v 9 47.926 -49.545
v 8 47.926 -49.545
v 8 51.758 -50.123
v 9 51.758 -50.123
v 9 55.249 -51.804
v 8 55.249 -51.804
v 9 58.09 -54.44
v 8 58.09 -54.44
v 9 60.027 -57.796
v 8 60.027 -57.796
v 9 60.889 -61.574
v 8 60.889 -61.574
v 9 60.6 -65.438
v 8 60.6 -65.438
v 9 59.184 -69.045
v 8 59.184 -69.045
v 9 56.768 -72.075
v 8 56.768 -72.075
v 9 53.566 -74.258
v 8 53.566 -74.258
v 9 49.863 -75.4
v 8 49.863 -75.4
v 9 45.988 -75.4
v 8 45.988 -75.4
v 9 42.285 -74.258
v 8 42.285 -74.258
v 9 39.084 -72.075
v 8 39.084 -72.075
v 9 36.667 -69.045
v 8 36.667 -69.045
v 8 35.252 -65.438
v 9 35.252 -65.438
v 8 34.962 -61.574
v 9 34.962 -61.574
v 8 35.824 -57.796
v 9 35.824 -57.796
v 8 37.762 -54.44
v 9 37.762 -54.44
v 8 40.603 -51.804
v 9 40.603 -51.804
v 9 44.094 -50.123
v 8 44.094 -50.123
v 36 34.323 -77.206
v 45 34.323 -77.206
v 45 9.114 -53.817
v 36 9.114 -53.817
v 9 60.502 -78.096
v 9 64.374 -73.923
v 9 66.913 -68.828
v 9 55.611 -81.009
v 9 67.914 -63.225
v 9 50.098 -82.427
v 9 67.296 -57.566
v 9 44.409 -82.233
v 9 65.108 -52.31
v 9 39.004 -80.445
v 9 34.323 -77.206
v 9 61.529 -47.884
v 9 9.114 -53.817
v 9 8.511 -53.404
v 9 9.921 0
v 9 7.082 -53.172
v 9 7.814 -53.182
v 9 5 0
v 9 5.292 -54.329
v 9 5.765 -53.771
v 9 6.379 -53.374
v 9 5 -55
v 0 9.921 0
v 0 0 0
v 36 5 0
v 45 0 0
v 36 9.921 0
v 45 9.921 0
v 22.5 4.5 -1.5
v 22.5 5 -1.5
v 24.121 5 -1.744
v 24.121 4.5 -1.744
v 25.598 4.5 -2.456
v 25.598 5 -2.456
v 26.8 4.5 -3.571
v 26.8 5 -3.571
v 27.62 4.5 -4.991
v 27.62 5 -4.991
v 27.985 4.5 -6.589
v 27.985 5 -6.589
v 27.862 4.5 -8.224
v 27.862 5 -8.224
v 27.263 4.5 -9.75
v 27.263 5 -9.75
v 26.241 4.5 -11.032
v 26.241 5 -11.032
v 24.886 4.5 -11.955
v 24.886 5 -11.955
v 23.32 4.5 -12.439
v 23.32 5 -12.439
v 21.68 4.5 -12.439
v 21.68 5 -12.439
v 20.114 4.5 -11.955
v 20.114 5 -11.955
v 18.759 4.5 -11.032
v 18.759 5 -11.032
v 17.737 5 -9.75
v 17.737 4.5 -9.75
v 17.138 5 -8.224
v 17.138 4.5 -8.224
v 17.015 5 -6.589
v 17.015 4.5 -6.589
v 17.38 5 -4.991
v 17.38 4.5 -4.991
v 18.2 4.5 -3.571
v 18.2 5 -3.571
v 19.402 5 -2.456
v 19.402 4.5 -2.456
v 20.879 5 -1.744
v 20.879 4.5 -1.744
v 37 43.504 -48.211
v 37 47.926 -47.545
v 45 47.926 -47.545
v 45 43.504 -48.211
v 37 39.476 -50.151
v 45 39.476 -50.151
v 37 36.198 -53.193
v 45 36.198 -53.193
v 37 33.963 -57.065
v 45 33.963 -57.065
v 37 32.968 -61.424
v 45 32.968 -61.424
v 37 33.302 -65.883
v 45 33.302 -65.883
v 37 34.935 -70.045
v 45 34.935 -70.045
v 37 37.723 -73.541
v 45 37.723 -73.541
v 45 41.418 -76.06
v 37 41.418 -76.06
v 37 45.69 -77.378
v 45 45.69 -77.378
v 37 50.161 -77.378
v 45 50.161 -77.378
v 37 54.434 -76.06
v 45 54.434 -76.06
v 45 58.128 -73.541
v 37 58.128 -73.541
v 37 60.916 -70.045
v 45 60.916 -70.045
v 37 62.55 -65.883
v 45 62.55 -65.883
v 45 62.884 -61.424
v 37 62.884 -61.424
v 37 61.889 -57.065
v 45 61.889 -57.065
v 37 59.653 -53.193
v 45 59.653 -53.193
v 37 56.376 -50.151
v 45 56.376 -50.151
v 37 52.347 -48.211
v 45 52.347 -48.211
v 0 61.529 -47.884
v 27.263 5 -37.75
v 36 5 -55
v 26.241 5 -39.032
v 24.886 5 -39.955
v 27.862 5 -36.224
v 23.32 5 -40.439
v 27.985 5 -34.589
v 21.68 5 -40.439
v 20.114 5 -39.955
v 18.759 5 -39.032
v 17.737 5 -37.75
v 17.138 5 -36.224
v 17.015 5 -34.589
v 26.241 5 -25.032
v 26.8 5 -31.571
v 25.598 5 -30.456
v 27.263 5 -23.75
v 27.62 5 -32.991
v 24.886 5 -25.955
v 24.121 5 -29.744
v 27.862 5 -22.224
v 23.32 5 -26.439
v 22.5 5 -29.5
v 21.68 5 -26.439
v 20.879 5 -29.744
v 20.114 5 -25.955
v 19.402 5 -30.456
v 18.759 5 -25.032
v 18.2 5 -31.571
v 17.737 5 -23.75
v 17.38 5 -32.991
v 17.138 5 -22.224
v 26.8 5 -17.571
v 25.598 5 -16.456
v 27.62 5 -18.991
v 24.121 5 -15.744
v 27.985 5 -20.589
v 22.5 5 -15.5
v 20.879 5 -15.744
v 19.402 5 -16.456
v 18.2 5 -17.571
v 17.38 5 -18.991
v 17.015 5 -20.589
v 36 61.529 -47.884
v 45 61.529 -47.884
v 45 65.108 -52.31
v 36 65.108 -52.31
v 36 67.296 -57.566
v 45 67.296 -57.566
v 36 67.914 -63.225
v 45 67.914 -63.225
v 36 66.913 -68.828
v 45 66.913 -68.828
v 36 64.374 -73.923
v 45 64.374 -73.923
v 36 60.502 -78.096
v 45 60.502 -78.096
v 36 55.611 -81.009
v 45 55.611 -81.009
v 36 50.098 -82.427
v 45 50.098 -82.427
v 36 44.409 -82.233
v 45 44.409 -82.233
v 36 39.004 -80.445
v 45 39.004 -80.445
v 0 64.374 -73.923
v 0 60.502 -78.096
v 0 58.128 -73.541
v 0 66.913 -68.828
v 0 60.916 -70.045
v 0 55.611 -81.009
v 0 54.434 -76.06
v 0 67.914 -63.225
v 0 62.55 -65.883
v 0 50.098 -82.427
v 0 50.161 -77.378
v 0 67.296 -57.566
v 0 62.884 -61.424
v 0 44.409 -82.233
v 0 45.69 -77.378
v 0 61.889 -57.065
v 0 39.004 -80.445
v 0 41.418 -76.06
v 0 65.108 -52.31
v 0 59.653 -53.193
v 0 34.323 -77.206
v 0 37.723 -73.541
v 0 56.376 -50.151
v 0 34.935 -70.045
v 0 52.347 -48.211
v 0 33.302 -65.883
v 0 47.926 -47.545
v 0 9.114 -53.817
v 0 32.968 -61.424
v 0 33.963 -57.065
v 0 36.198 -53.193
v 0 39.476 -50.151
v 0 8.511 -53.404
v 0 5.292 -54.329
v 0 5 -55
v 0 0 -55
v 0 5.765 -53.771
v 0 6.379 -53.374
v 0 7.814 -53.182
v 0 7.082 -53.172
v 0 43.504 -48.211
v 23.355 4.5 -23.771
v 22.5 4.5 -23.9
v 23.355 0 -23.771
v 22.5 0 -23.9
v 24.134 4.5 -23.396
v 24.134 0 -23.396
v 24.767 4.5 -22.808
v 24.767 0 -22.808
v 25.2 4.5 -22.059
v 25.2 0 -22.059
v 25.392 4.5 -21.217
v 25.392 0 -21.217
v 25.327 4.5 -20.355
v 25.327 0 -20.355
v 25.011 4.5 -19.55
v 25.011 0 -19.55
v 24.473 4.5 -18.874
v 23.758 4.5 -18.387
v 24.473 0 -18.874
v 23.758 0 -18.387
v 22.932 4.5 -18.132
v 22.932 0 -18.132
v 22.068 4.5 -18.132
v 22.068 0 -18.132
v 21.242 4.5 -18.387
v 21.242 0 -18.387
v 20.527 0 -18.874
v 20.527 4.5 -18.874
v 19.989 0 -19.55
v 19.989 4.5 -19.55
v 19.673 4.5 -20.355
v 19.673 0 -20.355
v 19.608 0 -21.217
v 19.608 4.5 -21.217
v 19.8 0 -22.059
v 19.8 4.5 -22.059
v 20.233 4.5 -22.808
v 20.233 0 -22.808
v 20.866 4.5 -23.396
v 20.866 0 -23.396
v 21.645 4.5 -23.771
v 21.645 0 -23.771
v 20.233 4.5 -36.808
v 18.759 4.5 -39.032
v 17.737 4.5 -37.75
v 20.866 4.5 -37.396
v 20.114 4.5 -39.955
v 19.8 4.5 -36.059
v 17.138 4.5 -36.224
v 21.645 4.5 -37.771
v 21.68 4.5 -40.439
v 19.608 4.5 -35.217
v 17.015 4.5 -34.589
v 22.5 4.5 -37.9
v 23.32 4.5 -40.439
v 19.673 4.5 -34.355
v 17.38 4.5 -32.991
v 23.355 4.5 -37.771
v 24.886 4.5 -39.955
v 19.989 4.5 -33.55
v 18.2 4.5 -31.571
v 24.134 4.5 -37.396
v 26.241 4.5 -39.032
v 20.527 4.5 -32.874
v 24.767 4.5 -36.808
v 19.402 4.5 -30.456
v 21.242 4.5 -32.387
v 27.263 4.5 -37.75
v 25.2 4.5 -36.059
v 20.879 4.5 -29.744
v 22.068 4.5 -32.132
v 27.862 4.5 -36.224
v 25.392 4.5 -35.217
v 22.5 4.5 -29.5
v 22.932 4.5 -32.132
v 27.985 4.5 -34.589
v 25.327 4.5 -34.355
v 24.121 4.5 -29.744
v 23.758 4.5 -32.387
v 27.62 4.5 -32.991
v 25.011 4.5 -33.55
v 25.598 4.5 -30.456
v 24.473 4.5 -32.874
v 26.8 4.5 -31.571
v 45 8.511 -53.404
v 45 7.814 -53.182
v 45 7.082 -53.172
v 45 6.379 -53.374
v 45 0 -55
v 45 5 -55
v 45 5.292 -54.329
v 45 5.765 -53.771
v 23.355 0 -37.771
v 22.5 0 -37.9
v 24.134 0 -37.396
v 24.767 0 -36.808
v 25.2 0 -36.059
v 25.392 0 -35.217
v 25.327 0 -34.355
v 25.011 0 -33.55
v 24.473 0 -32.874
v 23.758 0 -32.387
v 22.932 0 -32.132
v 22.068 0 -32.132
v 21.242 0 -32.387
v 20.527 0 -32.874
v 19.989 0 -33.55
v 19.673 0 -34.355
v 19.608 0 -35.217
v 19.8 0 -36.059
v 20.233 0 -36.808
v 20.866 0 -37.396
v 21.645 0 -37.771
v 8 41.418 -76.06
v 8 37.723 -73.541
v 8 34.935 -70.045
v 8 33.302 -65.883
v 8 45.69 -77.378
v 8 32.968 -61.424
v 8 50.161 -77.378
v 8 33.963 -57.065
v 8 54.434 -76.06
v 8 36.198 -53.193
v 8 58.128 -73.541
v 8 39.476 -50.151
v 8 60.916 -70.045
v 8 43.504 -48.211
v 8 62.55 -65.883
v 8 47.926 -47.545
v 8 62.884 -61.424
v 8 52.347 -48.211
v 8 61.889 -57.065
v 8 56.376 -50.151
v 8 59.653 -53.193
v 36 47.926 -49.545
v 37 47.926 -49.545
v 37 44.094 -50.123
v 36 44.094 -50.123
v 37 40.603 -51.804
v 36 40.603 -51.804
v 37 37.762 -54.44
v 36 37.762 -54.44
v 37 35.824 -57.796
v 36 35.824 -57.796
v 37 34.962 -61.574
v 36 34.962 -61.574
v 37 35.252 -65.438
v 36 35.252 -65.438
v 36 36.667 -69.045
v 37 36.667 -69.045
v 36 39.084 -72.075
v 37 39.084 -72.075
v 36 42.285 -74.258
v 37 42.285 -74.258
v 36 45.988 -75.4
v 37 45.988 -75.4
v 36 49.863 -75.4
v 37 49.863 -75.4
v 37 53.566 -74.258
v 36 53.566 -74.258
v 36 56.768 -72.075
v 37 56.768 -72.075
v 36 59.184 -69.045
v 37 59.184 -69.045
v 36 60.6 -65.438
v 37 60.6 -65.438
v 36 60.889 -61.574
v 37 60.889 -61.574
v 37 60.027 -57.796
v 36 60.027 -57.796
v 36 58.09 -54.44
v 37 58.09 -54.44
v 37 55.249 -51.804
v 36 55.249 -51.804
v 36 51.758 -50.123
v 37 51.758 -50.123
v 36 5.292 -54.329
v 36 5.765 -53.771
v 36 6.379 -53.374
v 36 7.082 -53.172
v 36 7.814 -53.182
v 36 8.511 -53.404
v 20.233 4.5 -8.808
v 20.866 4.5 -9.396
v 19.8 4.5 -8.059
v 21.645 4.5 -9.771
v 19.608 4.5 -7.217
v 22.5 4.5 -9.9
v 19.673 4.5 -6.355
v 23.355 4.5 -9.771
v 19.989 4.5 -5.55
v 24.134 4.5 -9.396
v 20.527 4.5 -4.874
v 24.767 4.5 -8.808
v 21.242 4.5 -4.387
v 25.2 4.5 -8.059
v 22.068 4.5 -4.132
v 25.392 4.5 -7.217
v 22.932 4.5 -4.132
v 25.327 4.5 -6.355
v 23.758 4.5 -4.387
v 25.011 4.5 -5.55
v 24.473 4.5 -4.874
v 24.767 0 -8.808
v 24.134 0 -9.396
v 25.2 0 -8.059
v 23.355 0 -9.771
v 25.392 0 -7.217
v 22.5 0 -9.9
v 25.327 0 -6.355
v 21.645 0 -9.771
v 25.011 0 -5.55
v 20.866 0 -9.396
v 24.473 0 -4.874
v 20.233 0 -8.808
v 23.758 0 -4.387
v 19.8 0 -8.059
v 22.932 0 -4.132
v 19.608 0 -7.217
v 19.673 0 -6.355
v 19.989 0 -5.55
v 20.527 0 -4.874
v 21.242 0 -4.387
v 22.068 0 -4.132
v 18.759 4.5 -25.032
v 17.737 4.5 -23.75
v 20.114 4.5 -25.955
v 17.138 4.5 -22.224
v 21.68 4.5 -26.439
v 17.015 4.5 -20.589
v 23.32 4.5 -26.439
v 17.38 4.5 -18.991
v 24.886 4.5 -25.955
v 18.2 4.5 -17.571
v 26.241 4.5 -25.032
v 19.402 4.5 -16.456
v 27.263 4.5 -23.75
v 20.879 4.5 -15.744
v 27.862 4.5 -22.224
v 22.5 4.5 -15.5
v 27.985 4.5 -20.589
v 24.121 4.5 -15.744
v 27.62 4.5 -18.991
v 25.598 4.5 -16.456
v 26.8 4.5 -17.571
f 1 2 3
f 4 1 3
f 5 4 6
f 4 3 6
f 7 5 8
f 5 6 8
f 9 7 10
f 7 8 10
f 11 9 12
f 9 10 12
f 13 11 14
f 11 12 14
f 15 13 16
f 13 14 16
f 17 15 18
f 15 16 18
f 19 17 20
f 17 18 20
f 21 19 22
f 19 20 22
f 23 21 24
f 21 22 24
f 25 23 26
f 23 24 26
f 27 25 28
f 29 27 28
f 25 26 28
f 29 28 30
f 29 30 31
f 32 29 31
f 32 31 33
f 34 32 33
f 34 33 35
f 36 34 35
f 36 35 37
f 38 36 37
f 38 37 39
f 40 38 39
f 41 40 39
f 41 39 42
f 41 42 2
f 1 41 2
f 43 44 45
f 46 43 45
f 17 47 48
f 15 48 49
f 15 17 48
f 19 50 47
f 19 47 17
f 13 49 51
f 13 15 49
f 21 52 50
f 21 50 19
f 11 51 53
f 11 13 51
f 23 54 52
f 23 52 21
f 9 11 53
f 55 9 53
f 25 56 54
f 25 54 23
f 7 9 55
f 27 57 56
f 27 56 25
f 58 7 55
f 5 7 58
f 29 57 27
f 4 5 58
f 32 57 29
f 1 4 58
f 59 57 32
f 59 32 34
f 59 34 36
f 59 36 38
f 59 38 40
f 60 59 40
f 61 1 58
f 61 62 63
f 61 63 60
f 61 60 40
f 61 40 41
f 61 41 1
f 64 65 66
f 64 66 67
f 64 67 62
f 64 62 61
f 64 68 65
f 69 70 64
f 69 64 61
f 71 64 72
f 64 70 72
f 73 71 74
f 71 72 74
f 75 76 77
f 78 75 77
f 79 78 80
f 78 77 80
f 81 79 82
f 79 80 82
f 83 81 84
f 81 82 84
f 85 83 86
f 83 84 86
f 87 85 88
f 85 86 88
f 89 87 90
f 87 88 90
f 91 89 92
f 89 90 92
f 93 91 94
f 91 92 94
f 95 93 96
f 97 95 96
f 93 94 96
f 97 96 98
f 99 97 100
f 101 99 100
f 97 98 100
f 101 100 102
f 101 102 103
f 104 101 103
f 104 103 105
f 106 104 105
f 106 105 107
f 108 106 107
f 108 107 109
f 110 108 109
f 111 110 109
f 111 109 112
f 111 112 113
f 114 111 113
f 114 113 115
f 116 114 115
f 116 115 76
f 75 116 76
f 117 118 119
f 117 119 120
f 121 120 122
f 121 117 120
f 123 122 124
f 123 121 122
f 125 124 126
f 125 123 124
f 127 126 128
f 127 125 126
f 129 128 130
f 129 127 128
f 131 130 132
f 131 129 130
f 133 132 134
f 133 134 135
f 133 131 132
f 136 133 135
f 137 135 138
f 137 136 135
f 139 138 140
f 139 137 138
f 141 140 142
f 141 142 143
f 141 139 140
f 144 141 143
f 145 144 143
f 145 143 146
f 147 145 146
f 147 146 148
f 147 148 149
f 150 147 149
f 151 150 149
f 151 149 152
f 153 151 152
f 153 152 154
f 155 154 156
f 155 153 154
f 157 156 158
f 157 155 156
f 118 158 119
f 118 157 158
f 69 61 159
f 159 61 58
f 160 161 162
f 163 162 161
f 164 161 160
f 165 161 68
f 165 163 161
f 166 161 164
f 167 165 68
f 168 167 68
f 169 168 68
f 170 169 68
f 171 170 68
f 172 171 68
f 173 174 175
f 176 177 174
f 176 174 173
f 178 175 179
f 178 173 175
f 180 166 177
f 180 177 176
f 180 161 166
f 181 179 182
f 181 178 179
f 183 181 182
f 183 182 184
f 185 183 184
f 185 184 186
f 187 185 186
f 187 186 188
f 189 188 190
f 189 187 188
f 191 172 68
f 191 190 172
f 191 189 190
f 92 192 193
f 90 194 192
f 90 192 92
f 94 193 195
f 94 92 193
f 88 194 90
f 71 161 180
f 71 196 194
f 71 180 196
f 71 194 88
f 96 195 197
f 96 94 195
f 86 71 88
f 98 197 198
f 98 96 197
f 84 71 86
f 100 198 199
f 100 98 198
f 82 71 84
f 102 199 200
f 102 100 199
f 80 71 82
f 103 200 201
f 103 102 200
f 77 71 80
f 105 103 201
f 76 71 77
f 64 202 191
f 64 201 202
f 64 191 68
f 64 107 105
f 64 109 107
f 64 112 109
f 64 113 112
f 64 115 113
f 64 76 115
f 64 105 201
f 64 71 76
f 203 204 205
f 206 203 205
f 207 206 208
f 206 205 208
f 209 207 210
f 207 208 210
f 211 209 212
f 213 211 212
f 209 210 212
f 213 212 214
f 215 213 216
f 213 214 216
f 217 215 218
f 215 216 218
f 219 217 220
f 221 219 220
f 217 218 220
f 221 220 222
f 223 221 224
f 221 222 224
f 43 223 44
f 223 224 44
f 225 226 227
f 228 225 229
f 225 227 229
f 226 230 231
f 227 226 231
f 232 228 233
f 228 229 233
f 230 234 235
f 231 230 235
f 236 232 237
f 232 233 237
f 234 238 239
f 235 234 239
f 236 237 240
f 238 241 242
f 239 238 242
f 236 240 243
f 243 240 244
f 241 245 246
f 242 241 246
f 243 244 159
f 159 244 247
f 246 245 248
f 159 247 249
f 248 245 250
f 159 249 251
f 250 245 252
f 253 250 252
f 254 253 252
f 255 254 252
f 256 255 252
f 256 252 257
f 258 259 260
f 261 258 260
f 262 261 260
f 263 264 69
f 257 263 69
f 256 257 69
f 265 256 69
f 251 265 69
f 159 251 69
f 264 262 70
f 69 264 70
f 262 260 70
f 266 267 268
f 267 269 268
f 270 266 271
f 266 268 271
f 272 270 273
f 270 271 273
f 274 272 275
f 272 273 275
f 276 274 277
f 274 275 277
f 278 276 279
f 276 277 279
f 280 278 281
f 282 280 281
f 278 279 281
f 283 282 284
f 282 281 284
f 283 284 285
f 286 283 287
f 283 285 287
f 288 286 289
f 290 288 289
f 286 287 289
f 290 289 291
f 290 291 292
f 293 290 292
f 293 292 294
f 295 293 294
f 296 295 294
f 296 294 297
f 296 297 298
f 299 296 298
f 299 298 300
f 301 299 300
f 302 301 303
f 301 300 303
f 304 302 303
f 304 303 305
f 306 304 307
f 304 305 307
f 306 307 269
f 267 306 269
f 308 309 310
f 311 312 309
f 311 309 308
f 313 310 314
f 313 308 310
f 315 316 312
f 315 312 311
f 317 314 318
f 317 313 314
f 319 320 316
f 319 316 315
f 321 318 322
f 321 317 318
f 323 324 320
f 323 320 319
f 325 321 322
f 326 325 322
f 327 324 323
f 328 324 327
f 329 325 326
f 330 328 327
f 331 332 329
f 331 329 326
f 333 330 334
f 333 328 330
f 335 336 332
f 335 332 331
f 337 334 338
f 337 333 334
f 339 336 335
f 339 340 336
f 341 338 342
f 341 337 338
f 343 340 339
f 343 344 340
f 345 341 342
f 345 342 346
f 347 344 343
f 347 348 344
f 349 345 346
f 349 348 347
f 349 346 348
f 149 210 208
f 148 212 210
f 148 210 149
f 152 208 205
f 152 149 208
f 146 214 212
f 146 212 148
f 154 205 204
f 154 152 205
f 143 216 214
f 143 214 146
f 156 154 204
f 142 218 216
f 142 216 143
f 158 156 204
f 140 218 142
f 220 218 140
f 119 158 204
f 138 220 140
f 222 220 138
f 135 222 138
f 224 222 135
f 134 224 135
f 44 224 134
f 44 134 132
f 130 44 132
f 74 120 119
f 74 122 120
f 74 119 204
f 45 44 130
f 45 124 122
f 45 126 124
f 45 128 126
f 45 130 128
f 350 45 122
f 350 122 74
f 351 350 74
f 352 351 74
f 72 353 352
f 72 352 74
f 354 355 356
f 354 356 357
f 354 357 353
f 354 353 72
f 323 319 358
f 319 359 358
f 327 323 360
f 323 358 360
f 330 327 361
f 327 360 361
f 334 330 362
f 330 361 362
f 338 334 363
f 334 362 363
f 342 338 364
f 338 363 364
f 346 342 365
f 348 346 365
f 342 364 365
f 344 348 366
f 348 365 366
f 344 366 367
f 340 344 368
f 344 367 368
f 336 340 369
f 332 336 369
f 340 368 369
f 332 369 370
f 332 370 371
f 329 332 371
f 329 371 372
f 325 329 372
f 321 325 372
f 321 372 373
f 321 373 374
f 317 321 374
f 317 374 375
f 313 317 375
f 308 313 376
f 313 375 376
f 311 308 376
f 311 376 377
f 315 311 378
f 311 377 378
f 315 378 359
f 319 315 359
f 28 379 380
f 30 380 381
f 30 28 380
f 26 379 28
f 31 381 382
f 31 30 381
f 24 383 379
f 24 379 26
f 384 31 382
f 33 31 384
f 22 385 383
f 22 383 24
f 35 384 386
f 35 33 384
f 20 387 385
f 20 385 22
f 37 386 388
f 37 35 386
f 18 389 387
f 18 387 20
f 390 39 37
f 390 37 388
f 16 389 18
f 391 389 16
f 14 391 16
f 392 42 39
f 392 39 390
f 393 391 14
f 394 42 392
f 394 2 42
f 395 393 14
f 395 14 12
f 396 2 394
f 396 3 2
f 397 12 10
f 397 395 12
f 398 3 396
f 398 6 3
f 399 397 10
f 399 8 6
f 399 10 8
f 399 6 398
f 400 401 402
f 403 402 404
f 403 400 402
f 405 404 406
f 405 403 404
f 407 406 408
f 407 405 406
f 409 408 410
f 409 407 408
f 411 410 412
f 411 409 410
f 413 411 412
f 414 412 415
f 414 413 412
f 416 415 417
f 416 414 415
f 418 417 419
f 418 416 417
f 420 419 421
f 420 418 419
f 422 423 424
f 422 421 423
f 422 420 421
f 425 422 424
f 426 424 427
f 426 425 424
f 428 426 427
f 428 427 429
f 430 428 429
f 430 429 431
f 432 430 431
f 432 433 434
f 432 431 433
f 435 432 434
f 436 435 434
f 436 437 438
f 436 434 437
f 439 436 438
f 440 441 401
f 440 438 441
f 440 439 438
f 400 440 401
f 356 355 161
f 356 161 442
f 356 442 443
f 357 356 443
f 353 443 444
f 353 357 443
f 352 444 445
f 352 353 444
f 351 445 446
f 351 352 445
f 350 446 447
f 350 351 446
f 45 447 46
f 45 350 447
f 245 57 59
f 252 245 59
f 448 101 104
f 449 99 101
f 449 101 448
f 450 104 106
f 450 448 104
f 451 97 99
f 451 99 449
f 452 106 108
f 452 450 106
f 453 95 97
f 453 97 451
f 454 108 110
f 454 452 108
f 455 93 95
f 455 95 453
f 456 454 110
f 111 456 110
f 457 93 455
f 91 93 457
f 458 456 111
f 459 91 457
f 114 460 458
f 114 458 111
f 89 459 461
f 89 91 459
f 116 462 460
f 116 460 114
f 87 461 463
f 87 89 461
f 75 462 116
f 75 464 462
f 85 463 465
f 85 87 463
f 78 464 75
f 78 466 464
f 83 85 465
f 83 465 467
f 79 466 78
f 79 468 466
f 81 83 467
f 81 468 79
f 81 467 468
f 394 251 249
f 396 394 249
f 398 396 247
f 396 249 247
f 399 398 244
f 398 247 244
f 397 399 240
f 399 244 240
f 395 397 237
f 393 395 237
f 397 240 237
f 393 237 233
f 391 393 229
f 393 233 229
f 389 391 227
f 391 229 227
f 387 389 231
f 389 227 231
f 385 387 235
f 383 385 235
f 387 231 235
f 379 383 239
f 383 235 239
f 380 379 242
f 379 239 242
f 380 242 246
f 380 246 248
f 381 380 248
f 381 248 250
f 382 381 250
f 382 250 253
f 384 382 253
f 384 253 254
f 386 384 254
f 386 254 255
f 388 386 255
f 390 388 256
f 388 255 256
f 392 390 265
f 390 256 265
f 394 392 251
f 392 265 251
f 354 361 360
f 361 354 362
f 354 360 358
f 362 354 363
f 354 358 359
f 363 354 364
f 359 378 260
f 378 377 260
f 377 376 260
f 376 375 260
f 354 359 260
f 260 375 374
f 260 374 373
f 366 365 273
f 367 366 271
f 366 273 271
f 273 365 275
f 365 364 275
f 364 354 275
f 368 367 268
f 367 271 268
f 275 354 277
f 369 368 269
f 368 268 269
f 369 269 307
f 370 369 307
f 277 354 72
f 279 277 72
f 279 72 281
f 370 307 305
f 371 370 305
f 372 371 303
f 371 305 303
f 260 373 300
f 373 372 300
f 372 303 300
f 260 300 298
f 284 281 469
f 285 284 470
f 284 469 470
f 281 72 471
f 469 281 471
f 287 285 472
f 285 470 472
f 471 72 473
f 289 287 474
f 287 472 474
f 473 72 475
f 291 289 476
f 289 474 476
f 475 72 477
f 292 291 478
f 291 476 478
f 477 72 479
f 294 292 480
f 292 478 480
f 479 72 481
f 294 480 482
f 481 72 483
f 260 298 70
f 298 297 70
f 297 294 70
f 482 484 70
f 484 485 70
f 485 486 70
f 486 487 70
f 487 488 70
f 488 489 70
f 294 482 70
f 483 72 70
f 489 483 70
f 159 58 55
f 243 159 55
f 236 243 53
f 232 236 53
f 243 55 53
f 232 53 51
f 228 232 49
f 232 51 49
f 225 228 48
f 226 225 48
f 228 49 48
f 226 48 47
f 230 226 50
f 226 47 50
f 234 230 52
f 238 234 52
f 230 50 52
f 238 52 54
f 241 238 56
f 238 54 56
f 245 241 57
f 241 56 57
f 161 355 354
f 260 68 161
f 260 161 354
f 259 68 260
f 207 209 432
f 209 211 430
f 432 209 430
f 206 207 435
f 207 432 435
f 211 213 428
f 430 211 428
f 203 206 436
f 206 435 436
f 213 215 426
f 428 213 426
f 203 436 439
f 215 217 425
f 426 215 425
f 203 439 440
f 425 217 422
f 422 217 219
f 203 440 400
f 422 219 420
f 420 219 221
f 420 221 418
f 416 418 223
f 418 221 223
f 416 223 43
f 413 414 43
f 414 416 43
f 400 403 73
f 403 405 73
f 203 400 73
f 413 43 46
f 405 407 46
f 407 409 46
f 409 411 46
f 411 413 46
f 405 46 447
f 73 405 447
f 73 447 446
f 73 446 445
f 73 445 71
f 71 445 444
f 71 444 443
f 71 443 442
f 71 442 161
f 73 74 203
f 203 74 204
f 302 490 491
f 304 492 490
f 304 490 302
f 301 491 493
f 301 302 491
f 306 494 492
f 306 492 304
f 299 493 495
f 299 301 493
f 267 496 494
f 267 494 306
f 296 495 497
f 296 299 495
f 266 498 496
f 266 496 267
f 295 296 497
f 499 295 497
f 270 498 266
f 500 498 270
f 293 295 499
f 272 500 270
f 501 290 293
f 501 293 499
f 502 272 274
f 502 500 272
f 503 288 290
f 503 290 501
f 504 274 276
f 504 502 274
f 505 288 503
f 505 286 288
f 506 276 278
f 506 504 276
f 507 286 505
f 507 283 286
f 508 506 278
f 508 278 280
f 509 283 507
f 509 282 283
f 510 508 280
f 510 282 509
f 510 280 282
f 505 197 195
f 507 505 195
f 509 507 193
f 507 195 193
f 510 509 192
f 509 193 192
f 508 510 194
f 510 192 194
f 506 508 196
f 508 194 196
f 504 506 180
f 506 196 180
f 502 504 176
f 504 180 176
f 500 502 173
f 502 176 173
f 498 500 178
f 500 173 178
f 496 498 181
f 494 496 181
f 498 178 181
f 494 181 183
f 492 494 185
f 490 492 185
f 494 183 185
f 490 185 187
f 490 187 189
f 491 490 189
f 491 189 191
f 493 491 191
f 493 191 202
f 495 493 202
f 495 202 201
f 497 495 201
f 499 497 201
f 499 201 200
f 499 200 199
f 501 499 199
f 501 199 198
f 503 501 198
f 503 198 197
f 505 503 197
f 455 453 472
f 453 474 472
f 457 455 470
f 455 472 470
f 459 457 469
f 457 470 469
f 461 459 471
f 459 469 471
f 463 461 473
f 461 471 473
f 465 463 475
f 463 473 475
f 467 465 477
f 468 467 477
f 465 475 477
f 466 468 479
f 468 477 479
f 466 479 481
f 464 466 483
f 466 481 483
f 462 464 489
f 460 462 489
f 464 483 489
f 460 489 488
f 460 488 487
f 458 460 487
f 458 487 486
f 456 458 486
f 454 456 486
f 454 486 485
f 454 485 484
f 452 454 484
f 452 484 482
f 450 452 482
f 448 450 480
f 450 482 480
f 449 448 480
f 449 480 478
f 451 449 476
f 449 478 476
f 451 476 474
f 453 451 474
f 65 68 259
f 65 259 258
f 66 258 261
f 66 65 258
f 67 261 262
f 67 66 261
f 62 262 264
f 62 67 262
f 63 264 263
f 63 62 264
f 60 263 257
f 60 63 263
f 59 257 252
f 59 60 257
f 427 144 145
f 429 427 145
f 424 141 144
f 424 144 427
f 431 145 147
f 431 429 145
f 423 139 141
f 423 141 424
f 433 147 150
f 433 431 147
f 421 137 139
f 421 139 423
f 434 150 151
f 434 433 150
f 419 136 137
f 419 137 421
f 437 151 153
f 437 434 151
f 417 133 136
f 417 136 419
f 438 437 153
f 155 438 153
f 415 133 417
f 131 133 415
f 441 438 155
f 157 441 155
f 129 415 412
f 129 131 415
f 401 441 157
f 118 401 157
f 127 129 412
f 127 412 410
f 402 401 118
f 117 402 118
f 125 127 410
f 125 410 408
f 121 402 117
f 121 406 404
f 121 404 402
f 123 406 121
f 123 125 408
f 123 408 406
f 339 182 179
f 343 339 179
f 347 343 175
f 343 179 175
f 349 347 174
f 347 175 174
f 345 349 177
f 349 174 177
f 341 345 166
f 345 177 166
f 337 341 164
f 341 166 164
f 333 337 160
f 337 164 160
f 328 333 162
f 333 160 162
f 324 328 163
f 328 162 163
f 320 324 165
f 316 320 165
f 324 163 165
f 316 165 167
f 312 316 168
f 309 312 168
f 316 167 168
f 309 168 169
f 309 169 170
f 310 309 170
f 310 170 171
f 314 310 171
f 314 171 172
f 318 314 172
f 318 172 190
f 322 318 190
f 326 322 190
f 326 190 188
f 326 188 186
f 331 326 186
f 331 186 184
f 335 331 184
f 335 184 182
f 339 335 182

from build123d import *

# Parameters (mm, degrees)
SKETCH_1_W                  = 45
SKETCH_1_H                  = 50
EXTRUDE_1_DEPTH             = 5
EXTRUDE_2_DEPTH             = 9
EXTRUDE_START               = -9
EXTRUDE_3_DEPTH             = 9
SKETCH_4_R                  = 13
CUT_EXTRUDE_1_DEPTH         = 9
CUT_EXTRUDE_START           = -9
SKETCH_5_R                  = 13
CUT_EXTRUDE_2_DEPTH         = 9
SKETCH_6_W                  = 45
SKETCH_6_H                  = 5
EXTRUDE_4_DEPTH             = 5
FILLET_1_R                  = 2.5
HOLE_WIZARD_C_1_D           = 5.8
HOLE_WIZARD_C_1_DEPTH       = 5
HOLE_WIZARD_C_1_CBORE_D     = 11
HOLE_WIZARD_C_1_CBORE_DEPTH = 0.5
HOLE_WIZARD_C_1_TIP         = 1.742495795
SKETCH_15_R                 = 15
CUT_EXTRUDE_3_DEPTH         = 8
CUT_EXTRUDE_START_2         = -8
SKETCH_16_R                 = 15
CUT_EXTRUDE_4_DEPTH         = 8


with BuildPart() as part:
    # 草图1 → 凸台-拉伸1 (new body)
    with BuildSketch(Plane(origin=(0, 0, 0), x_dir=(1, 0, 0), z_dir=(0, 1, 0))):
        with Locations((22.5, 25)):
            Rectangle(SKETCH_1_W, SKETCH_1_H)
    extrude(amount=EXTRUDE_1_DEPTH)

    # 草图2 → 凸台-拉伸2 (add)
    with BuildSketch(Plane(origin=(45, 0, 0), x_dir=(0, 0, -1), z_dir=(1, 0, 0))):
        with BuildLine():
            Line((0, 5), (0, 9.920540101))
            Line((0, 9.920540101), (47.883739104, 61.528943381))
            ThreePointArc((47.883739104, 61.528943381), (76.148210795, 62.587073829), (77.206341243, 34.322602138))
            Line((77.206341243, 34.322602138), (50, 5))
            Line((50, 5), (0, 5))
        make_face()
    extrude(amount=-EXTRUDE_2_DEPTH)

    # 草图3 → 凸台-拉伸3 (add)
    with BuildSketch(Plane.ZY.offset(EXTRUDE_START)):
        with BuildLine():
            Line((-50, 5), (0, 5))
            Line((0, 5), (0, 9.920540101))
            Line((0, 9.920540101), (-47.883739104, 61.528943381))
            ThreePointArc((-47.883739104, 61.528943381), (-76.148210795, 62.587073829), (-77.206341243, 34.322602138))
            Line((-77.206341243, 34.322602138), (-50, 5))
        make_face()
    extrude(amount=EXTRUDE_3_DEPTH)

    # 草图4 → 切除-拉伸1 (cut)
    with BuildSketch(Plane.ZY):
        with Locations((-62.545040174, 47.92577276)):
            Circle(SKETCH_4_R)
    extrude(amount=-CUT_EXTRUDE_1_DEPTH, mode=Mode.SUBTRACT)

    # 草图5 → 切除-拉伸2 (cut)
    with BuildSketch(Plane(origin=(45, 0, 0), x_dir=(0, 0, -1), z_dir=(1, 0, 0)).offset(CUT_EXTRUDE_START)):
        with Locations(Location((62.545040174, 47.92577276, 0), (0, 0, 180))):
            Circle(SKETCH_5_R)
    extrude(amount=CUT_EXTRUDE_2_DEPTH, mode=Mode.SUBTRACT)

    # 草图6 → 凸台-拉伸4 (add)
    with BuildSketch(Plane(origin=(0, 0, -50), x_dir=(-1, 0, 0), z_dir=(0, 0, -1))):
        with Locations((-22.5, 2.5)):
            Rectangle(SKETCH_6_W, SKETCH_6_H)
    extrude(amount=EXTRUDE_4_DEPTH)

    # 圆角1
    # the kernel refuses this fillet: 2.5 mm, written as the material it adds along each edge
    with BuildSketch(Plane(origin=(9, 5, -50), x_dir=(0, 0, -1), z_dir=(-1, 0, 0))) as fillet_1_piece_1:
        with BuildLine():
            CenterArc((5.650108918, -2.413992211), FILLET_1_R, 105.072647289, 117.783385174)
            Line((3.817446285, -4.114388539), (3.780793032, -4.148396465))
            Line((3.780793032, -4.148396465), (-0.036653253, -0.034007927))
            Line((-0.036653253, -0.034007927), (0, 0.05))
            ThreePointArc((0, 0.05), (2.5, 0.05), (4.986997822, 0.048279844))
            Line((4.986997822, 0.048279844), (5, 0))
        make_face()
    extrude(amount=9)
    with BuildSketch(Plane(origin=(45, 5, -50), x_dir=(0, 0.7330650534621563, -0.6801585310738415), z_dir=(-1, 0, 0))) as fillet_1_piece_2:
        with BuildLine():
            CenterArc((5.612583111, 2.5), FILLET_1_R, 152.216614826, 117.783385174)
            Line((3.400792655, 3.665325267), (3.356556846, 3.688631773))
            ThreePointArc((3.356556846, 3.688631773), (1.663743075, 1.86667056), (-0.036653253, 0.034007927))
            Line((-0.036653253, 0.034007927), (0, -0.05))
            Line((0, -0.05), (5.612583111, -0.05))
            Line((5.612583111, -0.05), (5.612583111, 0))
        make_face()
    extrude(amount=9)

    # 打孔尺寸(%根据六角头螺)栓 C 级的类型1
    with Locations(Plane(origin=(22.5, 5, -21), x_dir=(0, 0, 1), z_dir=(0, 1, 0))):
        with Locations((0, 0), (14, 0), (-14, 0)):
            CounterBoreHole(HOLE_WIZARD_C_1_D / 2, HOLE_WIZARD_C_1_CBORE_D / 2, HOLE_WIZARD_C_1_CBORE_DEPTH, depth=HOLE_WIZARD_C_1_DEPTH)
            with Locations((0, 0, -(HOLE_WIZARD_C_1_DEPTH + HOLE_WIZARD_C_1_TIP / 2))):  # 118° drill point
                Cone(0, HOLE_WIZARD_C_1_D / 2, HOLE_WIZARD_C_1_TIP, mode=Mode.SUBTRACT)

    # 草图15 → 切除-拉伸3 (cut)
    with BuildSketch(Plane.ZY):
        with Locations((-62.545040174, 47.92577276)):
            Circle(SKETCH_15_R)
    extrude(amount=-CUT_EXTRUDE_3_DEPTH, mode=Mode.SUBTRACT)

    # 草图16 → 切除-拉伸4 (cut)
    with BuildSketch(Plane(origin=(45, 0, 0), x_dir=(0, 0, -1), z_dir=(1, 0, 0)).offset(CUT_EXTRUDE_START_2)):
        with Locations(Location((62.545040174, 47.92577276, 0), (0, 0, 180))):
            Circle(SKETCH_16_R)
    extrude(amount=CUT_EXTRUDE_4_DEPTH, mode=Mode.SUBTRACT)


solid = part.part
